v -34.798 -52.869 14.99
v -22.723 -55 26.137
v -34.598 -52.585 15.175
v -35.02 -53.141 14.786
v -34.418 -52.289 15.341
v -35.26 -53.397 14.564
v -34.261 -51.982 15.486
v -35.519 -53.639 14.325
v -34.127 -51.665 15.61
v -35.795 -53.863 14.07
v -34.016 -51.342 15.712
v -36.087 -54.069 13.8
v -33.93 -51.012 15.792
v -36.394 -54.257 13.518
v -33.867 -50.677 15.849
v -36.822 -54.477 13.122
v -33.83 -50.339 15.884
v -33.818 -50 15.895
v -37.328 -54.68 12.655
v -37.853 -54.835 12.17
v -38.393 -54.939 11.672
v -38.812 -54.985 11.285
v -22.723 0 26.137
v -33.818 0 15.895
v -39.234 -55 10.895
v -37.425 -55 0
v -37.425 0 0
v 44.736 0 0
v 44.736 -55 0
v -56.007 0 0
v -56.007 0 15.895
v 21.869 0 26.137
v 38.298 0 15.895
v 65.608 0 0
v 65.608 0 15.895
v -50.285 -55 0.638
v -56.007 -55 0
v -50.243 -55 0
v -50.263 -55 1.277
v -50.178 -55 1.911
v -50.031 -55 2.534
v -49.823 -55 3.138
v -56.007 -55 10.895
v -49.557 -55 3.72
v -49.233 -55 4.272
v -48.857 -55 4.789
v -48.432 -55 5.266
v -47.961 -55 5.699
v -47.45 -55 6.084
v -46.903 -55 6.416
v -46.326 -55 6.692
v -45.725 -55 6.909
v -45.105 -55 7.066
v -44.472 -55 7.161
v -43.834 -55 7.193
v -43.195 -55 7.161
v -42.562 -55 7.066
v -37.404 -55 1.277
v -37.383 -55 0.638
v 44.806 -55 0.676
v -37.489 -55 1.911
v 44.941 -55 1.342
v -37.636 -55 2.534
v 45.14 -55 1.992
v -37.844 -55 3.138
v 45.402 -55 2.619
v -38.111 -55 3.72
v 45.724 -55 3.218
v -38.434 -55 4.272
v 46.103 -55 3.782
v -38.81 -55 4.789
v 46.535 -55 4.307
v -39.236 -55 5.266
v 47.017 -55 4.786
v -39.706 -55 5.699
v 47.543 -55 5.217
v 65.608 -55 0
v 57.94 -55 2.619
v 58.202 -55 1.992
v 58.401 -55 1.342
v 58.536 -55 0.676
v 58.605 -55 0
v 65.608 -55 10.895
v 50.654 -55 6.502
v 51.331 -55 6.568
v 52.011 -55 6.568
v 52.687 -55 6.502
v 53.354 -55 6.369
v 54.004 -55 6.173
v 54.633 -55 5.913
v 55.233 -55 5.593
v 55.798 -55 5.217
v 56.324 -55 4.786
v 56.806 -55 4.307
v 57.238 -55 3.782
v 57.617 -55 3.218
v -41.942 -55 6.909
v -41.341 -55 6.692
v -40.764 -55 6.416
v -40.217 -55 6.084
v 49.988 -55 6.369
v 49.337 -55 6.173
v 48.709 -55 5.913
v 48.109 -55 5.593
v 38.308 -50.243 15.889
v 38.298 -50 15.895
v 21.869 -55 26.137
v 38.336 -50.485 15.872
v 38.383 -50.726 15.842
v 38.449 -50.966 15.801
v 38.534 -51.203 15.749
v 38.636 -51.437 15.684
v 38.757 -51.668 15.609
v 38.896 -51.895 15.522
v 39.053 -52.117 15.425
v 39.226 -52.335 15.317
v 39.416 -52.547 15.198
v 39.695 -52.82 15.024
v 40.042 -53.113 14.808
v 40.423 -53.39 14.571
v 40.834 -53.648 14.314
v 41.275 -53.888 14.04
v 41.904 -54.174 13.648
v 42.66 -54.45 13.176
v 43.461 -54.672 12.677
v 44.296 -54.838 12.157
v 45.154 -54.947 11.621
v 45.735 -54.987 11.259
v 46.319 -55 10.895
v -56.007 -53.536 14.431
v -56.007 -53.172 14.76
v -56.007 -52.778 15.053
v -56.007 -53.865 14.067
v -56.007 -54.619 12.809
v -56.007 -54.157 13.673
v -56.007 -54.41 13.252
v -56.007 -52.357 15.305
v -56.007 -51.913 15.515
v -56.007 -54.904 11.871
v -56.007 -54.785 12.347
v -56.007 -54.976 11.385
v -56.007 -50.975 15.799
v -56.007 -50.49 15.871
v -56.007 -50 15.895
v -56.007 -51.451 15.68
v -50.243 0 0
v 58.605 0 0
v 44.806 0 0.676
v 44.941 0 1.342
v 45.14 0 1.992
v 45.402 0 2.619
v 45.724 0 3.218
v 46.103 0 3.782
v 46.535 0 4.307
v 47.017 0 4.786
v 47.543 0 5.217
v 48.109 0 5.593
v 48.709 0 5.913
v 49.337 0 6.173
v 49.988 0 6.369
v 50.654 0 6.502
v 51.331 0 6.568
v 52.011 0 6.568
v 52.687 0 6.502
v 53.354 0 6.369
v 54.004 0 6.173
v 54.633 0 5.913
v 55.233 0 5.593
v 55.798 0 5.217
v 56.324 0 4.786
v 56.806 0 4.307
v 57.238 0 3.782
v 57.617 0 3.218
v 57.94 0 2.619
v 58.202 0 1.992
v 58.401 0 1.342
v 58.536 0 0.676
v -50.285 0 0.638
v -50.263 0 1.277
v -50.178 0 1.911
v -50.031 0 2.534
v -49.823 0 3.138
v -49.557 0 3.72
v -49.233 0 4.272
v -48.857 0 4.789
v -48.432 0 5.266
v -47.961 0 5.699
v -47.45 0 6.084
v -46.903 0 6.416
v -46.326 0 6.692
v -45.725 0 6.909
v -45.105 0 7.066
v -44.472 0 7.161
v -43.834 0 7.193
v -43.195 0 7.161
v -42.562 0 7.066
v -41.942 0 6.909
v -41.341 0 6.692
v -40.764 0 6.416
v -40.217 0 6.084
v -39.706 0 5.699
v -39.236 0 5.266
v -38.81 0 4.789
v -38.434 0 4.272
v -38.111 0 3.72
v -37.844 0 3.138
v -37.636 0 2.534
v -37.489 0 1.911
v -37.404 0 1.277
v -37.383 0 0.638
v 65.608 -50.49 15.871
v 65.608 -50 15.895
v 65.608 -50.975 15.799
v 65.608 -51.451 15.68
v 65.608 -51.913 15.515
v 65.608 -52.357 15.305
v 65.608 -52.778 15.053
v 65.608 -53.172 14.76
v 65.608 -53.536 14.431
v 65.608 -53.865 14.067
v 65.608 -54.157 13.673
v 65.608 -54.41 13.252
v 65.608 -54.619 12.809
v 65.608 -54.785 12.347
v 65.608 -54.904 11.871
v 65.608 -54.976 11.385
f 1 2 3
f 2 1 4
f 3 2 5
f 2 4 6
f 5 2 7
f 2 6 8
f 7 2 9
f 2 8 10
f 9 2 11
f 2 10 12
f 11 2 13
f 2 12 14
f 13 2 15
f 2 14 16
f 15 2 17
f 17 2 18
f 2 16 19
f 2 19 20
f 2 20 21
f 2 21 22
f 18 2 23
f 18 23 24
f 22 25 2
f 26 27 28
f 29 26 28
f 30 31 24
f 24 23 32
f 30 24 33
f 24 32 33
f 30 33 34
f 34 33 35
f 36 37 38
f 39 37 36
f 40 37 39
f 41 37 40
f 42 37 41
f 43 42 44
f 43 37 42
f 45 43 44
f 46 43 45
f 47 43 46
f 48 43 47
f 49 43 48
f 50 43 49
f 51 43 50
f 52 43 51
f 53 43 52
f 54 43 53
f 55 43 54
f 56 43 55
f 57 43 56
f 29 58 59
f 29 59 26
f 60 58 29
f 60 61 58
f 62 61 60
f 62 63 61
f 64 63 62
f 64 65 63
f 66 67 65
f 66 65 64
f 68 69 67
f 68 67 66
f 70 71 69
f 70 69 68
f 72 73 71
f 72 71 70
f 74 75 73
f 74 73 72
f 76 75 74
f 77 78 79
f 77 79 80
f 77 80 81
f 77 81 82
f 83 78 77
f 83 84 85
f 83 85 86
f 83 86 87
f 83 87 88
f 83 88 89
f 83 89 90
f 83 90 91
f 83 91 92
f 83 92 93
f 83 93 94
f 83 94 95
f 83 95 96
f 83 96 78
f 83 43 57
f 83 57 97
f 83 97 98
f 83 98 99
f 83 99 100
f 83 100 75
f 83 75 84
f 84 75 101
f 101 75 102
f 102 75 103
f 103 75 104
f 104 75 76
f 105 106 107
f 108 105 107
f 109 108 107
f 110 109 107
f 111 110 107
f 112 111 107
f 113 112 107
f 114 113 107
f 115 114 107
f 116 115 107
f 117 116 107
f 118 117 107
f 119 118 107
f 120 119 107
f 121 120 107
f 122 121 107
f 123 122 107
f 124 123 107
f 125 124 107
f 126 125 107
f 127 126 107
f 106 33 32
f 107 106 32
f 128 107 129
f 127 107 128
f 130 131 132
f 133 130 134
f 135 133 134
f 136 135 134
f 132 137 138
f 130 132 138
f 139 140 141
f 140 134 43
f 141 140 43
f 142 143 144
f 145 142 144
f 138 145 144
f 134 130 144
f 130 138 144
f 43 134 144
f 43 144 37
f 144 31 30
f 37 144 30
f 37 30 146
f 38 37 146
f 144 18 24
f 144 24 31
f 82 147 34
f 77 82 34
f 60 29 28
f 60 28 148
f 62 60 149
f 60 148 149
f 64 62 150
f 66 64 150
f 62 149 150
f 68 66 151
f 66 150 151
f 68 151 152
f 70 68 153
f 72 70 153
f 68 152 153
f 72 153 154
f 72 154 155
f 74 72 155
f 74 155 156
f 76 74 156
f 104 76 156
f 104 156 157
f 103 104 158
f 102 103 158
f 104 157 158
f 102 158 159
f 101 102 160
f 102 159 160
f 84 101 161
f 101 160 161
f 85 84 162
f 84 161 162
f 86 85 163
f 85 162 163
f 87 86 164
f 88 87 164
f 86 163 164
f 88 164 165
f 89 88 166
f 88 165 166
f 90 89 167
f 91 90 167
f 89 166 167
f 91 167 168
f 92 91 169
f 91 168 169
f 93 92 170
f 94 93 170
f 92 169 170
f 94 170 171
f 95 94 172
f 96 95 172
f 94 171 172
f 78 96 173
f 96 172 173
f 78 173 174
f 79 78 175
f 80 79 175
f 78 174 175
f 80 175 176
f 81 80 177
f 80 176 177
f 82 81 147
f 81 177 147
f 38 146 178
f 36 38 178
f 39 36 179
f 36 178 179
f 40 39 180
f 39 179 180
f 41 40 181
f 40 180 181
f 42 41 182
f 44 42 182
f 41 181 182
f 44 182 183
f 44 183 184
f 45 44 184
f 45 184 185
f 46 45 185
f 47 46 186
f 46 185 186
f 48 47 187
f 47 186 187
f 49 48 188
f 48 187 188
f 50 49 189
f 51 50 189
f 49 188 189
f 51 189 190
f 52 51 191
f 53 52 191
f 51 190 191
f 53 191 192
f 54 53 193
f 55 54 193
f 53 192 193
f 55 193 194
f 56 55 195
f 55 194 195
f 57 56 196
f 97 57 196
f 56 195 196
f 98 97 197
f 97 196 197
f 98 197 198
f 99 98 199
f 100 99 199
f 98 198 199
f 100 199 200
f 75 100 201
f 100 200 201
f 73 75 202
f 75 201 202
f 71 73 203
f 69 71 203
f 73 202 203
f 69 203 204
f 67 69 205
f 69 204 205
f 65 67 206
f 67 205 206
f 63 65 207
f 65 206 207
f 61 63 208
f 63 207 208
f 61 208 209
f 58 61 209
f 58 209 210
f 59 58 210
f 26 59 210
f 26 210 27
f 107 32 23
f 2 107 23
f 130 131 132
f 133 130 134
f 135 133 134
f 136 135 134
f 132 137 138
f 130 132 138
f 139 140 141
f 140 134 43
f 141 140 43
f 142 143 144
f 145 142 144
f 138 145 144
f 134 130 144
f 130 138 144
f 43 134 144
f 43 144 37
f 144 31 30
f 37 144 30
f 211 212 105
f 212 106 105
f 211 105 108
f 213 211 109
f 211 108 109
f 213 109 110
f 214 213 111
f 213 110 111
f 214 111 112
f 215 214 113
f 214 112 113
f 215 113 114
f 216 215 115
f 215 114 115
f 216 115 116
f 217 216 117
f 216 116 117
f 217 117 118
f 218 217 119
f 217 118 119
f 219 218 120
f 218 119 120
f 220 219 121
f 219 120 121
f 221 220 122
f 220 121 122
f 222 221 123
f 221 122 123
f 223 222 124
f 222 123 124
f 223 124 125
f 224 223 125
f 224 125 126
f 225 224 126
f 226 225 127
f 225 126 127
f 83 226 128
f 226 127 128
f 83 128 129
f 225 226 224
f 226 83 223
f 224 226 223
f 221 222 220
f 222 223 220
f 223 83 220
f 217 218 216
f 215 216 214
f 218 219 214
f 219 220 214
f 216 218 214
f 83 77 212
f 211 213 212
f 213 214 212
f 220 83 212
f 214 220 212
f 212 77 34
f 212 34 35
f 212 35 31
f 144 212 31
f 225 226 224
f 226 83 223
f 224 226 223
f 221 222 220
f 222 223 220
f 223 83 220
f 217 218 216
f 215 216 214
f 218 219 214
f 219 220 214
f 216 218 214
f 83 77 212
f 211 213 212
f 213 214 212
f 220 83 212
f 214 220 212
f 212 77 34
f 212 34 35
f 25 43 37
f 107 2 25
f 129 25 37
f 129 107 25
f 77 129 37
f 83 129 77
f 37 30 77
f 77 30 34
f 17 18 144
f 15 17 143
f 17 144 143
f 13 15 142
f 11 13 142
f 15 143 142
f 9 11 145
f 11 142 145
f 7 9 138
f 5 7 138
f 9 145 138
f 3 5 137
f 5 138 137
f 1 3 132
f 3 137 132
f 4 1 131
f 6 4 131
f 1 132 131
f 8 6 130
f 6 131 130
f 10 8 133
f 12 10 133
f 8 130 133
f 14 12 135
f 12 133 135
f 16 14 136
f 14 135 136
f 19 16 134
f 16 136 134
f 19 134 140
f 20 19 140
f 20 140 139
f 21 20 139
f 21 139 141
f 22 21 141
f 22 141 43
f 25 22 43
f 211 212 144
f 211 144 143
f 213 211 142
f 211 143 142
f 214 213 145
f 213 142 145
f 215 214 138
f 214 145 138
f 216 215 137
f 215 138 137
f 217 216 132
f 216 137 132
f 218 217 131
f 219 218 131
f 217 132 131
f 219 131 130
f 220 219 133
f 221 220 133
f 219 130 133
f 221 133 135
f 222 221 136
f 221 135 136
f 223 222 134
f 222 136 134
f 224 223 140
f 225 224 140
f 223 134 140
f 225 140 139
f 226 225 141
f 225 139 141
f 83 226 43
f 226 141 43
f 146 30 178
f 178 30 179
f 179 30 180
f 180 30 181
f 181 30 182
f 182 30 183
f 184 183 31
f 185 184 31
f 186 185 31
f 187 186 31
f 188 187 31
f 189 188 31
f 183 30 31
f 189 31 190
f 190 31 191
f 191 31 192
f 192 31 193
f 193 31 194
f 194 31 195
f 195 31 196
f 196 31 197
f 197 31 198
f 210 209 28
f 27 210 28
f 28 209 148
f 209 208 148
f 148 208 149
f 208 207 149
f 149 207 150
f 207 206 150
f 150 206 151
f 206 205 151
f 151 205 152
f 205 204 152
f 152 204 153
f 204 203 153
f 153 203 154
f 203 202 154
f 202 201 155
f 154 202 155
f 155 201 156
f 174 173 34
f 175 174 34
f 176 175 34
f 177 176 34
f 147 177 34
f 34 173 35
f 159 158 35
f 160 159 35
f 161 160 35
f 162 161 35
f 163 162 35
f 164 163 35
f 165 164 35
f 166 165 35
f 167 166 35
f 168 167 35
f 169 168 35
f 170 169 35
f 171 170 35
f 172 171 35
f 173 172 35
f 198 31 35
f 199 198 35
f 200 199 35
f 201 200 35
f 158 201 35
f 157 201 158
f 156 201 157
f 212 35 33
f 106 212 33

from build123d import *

# Parameters (mm, degrees)
F2_DEPTH = 55
F3_R     = 5
F4_R     = 5
F5_R     = 5


with BuildPart() as f2:
    # F1 (on face) → F2 (new body)
    with BuildSketch(Plane.XZ):
        with BuildLine():
            ThreePointArc((44.7364263237, 0), (51.6707431525, 6.576540475), (58.6050599813, 0))
            Line((58.6050599813, 0), (65.6081959605, 0))
            Line((65.6081959605, 0), (65.6081959605, 15.8953191712))
            Line((65.6081959605, 15.8953191712), (38.2981188595, 15.8953191712))
            Line((38.2981188595, 15.8953191712), (33.3908423781, 15.8953191712))
            Line((33.3908423781, 15.8953191712), (-29.3370001018, 15.8953191712))
            Line((-29.3370001018, 15.8953191712), (-33.8175594807, 15.8953191712))
            Line((-33.8175594807, 15.8953191712), (-56.007001549, 15.8953191712))
            Line((-56.007001549, 15.8953191712), (-56.007001549, 0))
            Line((-56.007001549, 0), (-50.2426885068, 0))
            ThreePointArc((-50.2426885068, 0), (-43.83370094, 7.1925667007), (-37.4247133732, 0))
            Line((-37.4247133732, 0), (44.7364263237, 0))
        make_face()
    extrude(amount=F2_DEPTH)

    # F4
    f4_edges = [f2.edges().sort_by_distance(p)[0] for p in [
        (4.800597, -55, 15.895319),
    ]]
    fillet(f4_edges, radius=F4_R)


with BuildPart() as f2b:
    # F0 (on Front) → F2, piece 2 (new body)
    with BuildSketch(Plane.XZ):
        Polygon((-56.007001549, 15.8953191712), (-56.007001549, 0), (65.6081959605, 0), (65.6081959605, 15.8953191712), (38.2981188595, 15.8953191712), (33.3908423781, 15.8953191712), (-29.3370001018, 15.8953191712), (-33.8175594807, 15.8953191712), align=None)
        Polygon((-22.7228403091, 26.1366013438), (-33.8175594807, 15.8953191712), (-29.3370001018, 15.8953191712), (33.3908423781, 15.8953191712), (38.2981188595, 15.8953191712), (21.8694005162, 26.1366013438), align=None)
    extrude(amount=F2_DEPTH)

    # F3
    f3_edges = [f2b.edges().sort_by_distance(p)[0] for p in [
        (51.953157, -55, 15.895319),
    ]]
    fillet(f3_edges, radius=F3_R)

    # F5
    f5_edges = [f2b.edges().sort_by_distance(p)[0] for p in [
        (-44.912281, -55, 15.895319),
    ]]
    fillet(f5_edges, radius=F5_R)


solid = Compound([f2.part, f2b.part])
